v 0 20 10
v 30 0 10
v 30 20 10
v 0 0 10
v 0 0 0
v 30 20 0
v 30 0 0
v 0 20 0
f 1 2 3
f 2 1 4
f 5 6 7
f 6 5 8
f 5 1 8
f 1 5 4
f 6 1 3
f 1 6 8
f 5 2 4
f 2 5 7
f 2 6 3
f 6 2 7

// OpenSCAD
union() {
  cube([20, 20, 10]);
  translate([10, 0, 0]) cube([20, 20, 10]);
}
